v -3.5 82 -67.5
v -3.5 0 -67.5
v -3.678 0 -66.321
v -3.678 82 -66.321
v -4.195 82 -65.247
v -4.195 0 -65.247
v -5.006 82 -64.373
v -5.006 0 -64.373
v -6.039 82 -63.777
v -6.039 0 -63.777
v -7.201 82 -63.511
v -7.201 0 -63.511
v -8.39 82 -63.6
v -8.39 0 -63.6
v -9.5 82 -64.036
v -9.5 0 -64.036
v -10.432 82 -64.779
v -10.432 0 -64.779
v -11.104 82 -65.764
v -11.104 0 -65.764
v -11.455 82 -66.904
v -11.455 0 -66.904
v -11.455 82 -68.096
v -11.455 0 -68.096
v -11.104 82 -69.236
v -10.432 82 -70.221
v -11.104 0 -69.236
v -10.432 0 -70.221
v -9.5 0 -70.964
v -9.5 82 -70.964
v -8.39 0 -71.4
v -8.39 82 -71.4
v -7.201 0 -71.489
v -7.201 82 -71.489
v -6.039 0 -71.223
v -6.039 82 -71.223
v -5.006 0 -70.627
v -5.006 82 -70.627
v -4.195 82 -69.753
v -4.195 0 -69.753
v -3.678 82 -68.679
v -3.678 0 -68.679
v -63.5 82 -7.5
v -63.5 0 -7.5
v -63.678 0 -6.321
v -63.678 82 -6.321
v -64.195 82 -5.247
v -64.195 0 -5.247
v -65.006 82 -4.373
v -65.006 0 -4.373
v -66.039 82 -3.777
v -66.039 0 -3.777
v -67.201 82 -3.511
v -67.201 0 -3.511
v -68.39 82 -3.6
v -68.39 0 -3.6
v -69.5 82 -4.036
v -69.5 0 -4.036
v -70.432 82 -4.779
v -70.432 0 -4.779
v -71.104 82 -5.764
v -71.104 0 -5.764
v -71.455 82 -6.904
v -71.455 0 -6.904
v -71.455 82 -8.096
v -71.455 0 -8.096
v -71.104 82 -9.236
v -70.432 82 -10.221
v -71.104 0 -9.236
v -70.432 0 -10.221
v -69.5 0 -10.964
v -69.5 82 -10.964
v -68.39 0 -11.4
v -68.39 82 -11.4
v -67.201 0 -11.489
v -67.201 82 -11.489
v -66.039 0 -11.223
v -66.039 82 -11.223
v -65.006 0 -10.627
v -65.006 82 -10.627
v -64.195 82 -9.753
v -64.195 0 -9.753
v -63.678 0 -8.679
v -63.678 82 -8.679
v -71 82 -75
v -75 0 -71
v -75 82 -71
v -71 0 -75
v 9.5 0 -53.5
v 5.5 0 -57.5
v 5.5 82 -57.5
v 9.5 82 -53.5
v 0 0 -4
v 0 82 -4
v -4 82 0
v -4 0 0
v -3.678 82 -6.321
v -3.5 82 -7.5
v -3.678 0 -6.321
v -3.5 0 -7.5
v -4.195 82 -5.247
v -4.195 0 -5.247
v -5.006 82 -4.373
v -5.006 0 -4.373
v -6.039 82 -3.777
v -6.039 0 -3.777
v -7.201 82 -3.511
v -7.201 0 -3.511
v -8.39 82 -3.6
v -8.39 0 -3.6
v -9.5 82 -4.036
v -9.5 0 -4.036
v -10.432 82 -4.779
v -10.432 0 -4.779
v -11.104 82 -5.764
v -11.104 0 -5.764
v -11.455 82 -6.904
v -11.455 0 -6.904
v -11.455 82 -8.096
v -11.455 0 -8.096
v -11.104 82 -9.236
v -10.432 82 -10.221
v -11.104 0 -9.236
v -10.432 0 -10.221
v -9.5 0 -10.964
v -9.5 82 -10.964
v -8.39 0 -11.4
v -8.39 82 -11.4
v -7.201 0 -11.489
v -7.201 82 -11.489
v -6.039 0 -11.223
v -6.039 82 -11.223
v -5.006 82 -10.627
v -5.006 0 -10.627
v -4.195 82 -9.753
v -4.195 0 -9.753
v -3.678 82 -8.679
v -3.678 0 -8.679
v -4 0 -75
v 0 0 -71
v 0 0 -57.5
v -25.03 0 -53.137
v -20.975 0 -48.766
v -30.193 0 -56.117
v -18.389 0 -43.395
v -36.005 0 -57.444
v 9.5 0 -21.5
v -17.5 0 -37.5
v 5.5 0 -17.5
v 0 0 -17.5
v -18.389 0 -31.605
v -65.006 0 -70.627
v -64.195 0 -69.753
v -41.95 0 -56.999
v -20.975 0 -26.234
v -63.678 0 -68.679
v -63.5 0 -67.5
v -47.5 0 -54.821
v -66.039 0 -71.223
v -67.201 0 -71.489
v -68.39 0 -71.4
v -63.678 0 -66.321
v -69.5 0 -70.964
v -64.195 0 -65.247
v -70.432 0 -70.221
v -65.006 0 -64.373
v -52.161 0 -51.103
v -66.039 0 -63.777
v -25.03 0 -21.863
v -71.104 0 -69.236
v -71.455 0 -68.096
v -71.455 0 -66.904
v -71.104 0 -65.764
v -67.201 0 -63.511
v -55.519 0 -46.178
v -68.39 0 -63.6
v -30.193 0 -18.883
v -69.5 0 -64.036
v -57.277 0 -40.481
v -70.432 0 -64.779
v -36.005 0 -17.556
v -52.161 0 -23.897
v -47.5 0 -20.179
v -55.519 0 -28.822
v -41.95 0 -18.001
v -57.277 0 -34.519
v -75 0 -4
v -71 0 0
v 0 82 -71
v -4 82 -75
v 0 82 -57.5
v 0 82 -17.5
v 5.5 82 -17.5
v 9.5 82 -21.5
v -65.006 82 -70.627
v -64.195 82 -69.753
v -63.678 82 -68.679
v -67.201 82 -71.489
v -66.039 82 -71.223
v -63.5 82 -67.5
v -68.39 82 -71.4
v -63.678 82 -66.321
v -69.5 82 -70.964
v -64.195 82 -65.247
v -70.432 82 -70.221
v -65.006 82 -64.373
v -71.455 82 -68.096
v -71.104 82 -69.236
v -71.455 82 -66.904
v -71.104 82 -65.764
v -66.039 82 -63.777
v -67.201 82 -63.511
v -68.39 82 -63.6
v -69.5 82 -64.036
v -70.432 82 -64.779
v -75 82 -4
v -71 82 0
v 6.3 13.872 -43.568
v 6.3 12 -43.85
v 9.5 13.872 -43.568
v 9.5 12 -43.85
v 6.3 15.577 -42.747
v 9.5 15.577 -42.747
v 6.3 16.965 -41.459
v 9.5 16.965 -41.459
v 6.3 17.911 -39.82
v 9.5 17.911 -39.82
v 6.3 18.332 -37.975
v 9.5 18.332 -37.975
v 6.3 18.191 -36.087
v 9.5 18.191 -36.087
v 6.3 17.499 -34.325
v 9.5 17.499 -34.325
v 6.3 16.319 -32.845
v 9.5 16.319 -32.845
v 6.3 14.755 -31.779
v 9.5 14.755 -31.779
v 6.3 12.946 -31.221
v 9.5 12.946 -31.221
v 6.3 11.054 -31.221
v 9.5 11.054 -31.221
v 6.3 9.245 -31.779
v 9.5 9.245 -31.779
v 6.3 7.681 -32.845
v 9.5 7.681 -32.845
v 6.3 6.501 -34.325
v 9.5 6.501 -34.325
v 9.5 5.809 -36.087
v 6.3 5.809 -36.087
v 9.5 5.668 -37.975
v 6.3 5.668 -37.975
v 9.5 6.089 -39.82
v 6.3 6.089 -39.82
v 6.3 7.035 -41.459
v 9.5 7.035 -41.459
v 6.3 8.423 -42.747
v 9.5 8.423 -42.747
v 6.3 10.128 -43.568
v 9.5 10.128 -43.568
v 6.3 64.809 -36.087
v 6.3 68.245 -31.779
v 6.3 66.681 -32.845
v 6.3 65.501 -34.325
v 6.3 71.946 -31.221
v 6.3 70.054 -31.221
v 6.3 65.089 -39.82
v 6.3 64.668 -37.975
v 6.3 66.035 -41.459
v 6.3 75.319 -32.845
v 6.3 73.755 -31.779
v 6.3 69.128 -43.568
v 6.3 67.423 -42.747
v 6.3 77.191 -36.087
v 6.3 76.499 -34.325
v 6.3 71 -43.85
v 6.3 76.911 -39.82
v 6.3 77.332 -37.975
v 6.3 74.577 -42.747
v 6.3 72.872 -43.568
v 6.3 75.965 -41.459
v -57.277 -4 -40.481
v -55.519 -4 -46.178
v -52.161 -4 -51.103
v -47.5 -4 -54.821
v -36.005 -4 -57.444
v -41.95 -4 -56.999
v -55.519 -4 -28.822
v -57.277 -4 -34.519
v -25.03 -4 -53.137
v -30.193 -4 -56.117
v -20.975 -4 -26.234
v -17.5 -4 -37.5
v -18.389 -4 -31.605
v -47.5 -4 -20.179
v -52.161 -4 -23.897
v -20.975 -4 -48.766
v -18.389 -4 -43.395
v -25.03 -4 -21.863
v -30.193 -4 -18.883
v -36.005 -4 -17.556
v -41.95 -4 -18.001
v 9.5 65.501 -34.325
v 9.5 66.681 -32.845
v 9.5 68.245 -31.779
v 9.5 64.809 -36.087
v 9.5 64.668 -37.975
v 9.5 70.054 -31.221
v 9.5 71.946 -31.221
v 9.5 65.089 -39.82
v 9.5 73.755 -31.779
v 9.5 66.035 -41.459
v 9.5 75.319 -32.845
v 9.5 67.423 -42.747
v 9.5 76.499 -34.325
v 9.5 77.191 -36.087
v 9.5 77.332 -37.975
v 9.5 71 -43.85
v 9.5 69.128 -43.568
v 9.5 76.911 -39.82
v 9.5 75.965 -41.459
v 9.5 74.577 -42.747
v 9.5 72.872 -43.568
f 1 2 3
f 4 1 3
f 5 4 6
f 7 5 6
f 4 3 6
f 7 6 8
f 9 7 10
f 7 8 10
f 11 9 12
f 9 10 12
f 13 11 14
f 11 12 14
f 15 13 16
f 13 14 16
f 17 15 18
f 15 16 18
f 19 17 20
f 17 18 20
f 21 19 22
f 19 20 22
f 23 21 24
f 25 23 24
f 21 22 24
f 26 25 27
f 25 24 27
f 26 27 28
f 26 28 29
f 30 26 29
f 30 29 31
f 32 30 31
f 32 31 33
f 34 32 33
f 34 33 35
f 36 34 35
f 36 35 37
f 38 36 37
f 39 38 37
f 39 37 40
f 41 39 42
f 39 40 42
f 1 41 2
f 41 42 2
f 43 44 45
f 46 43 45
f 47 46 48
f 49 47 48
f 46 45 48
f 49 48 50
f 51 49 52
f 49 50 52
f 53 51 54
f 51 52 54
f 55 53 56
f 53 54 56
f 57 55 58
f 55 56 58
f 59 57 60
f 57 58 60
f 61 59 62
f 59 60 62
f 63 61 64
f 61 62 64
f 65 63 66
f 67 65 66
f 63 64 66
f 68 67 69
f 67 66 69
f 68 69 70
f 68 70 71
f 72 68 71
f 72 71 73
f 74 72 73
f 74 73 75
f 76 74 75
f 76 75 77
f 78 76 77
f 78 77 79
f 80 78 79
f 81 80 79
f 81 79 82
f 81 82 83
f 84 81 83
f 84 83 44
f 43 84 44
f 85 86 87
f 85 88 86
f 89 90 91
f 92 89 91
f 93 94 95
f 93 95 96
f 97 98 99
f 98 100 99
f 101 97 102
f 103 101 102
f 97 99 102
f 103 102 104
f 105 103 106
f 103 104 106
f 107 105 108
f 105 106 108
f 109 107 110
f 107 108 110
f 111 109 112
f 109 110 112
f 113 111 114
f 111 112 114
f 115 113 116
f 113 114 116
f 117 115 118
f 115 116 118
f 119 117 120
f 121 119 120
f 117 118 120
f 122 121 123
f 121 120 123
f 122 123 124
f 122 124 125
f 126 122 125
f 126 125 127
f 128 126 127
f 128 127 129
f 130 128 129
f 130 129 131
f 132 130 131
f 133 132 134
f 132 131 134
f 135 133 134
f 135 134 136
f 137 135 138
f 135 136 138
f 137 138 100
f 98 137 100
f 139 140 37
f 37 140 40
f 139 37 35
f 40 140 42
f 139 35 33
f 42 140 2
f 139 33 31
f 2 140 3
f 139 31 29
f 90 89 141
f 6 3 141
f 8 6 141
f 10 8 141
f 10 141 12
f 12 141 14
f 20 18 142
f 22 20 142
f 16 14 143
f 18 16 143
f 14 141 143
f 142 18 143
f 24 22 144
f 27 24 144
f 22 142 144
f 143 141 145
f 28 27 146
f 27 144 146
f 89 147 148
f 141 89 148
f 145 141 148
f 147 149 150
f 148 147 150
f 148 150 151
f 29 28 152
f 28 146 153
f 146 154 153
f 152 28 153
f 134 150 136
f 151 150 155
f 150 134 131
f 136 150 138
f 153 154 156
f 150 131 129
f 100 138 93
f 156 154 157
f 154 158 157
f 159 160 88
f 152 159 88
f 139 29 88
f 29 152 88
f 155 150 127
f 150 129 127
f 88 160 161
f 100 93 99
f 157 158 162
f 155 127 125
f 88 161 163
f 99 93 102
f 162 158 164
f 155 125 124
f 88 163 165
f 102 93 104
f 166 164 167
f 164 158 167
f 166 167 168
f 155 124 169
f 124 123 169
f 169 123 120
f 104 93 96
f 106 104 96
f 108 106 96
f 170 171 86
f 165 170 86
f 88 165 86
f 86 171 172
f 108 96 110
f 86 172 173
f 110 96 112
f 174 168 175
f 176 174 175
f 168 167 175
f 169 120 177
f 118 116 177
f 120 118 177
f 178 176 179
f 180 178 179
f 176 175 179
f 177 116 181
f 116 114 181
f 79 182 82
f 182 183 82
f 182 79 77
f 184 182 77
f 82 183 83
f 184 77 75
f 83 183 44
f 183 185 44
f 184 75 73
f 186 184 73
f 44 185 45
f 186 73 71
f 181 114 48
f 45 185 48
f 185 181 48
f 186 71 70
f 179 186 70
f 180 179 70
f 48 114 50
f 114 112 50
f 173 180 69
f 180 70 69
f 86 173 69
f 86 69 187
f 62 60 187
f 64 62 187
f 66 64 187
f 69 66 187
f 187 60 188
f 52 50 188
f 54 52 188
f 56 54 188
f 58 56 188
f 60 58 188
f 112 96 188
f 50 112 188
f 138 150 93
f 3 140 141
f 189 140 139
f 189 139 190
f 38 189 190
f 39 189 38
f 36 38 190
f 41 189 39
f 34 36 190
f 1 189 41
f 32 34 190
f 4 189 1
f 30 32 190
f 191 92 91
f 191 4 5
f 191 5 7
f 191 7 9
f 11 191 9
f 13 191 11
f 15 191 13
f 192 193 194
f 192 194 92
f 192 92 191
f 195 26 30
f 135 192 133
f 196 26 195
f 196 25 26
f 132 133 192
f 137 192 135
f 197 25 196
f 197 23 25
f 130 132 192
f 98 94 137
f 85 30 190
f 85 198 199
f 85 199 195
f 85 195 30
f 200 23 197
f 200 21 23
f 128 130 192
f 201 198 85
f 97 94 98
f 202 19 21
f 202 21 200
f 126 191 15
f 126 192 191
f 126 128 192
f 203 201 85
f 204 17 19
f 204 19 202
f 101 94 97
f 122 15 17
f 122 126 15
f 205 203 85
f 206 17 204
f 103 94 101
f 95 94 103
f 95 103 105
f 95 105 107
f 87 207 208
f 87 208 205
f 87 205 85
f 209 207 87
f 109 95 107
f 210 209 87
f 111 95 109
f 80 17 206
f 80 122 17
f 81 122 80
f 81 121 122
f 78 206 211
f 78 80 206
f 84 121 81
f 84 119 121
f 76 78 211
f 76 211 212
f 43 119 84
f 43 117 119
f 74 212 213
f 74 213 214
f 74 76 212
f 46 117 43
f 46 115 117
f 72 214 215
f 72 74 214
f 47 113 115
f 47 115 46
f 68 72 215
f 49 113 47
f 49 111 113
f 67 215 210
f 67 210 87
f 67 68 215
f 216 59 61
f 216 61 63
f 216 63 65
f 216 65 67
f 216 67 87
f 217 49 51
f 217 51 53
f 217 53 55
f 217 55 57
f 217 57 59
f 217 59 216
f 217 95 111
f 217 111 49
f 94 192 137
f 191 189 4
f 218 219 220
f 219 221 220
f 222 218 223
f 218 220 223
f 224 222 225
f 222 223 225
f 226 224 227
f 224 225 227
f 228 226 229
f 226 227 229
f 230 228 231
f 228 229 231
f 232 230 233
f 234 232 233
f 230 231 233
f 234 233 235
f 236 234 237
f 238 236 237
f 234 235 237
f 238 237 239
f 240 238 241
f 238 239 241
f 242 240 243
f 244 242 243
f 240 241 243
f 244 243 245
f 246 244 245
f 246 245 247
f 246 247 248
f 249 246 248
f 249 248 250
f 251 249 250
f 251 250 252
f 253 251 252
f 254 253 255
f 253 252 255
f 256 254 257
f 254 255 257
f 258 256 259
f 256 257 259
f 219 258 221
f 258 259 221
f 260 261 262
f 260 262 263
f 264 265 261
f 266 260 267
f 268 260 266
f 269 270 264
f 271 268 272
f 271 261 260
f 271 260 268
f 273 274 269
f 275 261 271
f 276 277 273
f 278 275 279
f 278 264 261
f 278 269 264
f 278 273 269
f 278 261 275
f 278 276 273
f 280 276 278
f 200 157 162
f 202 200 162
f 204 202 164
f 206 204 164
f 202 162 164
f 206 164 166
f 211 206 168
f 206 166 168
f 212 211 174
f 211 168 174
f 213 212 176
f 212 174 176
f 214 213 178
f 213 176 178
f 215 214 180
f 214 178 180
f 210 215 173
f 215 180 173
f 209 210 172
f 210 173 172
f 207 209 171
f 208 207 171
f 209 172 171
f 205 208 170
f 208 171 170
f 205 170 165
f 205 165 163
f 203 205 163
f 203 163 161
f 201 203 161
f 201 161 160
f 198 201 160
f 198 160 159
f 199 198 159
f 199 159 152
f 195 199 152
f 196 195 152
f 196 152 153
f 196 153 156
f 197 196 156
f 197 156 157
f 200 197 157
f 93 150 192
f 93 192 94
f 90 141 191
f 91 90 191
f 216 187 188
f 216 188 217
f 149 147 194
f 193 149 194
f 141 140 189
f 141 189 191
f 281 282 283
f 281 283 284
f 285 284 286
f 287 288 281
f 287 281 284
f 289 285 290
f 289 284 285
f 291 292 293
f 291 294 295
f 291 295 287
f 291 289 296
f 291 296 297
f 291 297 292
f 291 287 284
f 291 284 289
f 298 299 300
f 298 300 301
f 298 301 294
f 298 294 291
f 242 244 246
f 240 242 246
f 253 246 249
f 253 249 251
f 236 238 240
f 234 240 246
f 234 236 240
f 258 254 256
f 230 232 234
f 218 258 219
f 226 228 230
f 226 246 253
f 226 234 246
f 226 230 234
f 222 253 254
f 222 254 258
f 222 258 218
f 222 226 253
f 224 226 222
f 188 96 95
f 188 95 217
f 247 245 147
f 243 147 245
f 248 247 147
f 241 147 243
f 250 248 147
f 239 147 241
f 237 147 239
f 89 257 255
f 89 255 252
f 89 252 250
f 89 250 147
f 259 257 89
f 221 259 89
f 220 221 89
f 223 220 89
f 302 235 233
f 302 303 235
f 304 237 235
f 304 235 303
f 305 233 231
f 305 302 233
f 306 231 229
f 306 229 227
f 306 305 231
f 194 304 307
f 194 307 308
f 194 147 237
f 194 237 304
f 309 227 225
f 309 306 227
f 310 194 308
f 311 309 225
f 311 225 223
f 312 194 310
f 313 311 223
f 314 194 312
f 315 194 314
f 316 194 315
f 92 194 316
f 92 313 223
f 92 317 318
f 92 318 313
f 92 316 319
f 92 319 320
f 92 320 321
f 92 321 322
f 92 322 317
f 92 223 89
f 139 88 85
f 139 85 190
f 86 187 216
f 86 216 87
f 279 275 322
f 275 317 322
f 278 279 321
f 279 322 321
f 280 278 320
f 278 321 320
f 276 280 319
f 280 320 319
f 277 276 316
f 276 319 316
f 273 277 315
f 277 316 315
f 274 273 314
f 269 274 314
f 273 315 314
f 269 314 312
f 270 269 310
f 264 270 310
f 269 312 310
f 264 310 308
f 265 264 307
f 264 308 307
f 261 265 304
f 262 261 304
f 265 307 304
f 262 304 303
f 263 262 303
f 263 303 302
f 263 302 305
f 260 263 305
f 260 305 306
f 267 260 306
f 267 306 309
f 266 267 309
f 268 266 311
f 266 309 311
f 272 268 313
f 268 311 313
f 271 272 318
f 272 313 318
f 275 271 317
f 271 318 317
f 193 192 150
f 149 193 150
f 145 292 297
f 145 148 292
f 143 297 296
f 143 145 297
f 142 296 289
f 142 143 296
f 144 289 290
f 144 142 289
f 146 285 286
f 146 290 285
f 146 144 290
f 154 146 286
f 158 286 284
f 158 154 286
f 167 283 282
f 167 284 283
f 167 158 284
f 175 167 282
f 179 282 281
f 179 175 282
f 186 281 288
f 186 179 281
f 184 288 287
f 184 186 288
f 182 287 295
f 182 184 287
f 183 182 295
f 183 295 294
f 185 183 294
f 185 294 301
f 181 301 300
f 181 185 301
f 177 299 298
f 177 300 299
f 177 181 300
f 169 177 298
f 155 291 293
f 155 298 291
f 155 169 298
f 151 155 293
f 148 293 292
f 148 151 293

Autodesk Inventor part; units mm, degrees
ref_plane "YZ Plane" through (0, 0, 0) normal (1, 0, 0) x (0, 1, 0)
ref_plane "XZ Plane" through (0, 0, 0) normal (0, 1, 0) x (-1, 0, 0)
ref_plane "XY Plane" through (0, 0, 0) normal (0, 0, 1) x (1, 0, 0)
sketch "Sketch1" plane through (0, 0, 0) normal (0, 1, 0) x (-1, 0, 0)
  line L0 (0, 0) -> (75, 0)
  line L1 (75, 0) -> (75, -75)
  line L2 (75, -75) -> (0, -75)
  line L3 (0, -75) -> (0, 0)
  dimension "d0" = 75
  dimension "d1" = 75
extrude "Extrusion1" add sketch "Sketch1" along normal blind 82
sketch "Sketch2" plane through (0, 0, 0) normal (0, -1, 0) x (1, 0, 0)
  circle A0 centre (-37.5, -37.5) radius 20
  line L0 (0, -75) -> (0, 0) projected
  line L1 (-75, -75) -> (0, -75) projected
  dimension "d4" = 40
  dimension "d5" = 37.5
  dimension "d6" = 37.5
extrude "Extrusion2" add sketch "Sketch2" along normal blind 4
sketch "Sketch4" plane through (0, 0, 0) normal (0, -1, 0) x (1, 0, 0)
  circle A0 centre (-67.5, -7.5) radius 4
  circle A1 centre (-7.5, -7.5) radius 4
  circle A2 centre (-7.5, -67.5) radius 4
  circle A3 centre (-67.5, -67.5) radius 4
  line L0 (0, 0) -> (-75, 0) projected
  line L1 (0, -75) -> (0, 0) projected
  dimension "d12" = 8
  dimension "d13" = 8
  dimension "d14" = 8
  dimension "d15" = 8
  dimension "d16" = 60
  dimension "d17" = 60
  dimension "d18" = 60
  dimension "d19" = 60
  dimension "d20" = 60
  dimension "d21" = 60
  dimension "d22" = 7.5
  dimension "d23" = 7.5
extrude "Extrusion4" cut sketch "Sketch4" against normal blind 120.8875
sketch "Sketch5" plane through (0, 0, 0) normal (1, 0, 0) x (0, 0, -1)
  line L0 (75, 0) -> (0, 0) projected
  line L1 (75, 82) -> (0, 82) projected
  line L2 (17.5, 0) -> (57.5, 0)
  line L3 (57.5, 0) -> (57.5, 82)
  line L4 (57.5, 82) -> (17.5, 82)
  line L5 (17.5, 82) -> (17.5, 0)
  line L6 (0, 0) -> (0, 82) projected
  dimension "d26" = 40
  dimension "d27" = 17.5
extrude "Extrusion5" add sketch "Sketch5" along normal blind 9.5 contours L0 L5 L1 L3
sketch "Sketch6" plane through (9.5, 0, 0) normal (1, 0, 0) x (0, 0, -1)
  circle A0 centre (37.5, 12) radius 6.35
  circle A1 centre (37.5, 71) radius 6.35
  line L0 (57.5, 82) -> (17.5, 82) projected
  line L1 (75, 0) -> (57.5, 0) projected
  line L2 (75, 82) -> (0, 82) projected
  line L3 (37.5, 82) -> (37.5, 0)
  line L4 (0, 0) -> (75, 0) projected
  dimension "d30" = 12.7
  dimension "d31" = 12.7
  dimension "d32" = 11
  dimension "d33" = 12
extrude "Extrusion6" cut sketch "Sketch6" against normal blind 3.2
chamfer "Chamfer1" distance 4 angle 45 4 edges at (0, 41, -75) (-75, 41, -75) (0, 41, 0) (-75, 41, 0)
chamfer "Chamfer2" distance 4 angle 45 2 edges at (9.5, 41, -17.5) (9.5, 41, -57.5)
properties part number "SDA 63 50" material "Aluminum 6061"
